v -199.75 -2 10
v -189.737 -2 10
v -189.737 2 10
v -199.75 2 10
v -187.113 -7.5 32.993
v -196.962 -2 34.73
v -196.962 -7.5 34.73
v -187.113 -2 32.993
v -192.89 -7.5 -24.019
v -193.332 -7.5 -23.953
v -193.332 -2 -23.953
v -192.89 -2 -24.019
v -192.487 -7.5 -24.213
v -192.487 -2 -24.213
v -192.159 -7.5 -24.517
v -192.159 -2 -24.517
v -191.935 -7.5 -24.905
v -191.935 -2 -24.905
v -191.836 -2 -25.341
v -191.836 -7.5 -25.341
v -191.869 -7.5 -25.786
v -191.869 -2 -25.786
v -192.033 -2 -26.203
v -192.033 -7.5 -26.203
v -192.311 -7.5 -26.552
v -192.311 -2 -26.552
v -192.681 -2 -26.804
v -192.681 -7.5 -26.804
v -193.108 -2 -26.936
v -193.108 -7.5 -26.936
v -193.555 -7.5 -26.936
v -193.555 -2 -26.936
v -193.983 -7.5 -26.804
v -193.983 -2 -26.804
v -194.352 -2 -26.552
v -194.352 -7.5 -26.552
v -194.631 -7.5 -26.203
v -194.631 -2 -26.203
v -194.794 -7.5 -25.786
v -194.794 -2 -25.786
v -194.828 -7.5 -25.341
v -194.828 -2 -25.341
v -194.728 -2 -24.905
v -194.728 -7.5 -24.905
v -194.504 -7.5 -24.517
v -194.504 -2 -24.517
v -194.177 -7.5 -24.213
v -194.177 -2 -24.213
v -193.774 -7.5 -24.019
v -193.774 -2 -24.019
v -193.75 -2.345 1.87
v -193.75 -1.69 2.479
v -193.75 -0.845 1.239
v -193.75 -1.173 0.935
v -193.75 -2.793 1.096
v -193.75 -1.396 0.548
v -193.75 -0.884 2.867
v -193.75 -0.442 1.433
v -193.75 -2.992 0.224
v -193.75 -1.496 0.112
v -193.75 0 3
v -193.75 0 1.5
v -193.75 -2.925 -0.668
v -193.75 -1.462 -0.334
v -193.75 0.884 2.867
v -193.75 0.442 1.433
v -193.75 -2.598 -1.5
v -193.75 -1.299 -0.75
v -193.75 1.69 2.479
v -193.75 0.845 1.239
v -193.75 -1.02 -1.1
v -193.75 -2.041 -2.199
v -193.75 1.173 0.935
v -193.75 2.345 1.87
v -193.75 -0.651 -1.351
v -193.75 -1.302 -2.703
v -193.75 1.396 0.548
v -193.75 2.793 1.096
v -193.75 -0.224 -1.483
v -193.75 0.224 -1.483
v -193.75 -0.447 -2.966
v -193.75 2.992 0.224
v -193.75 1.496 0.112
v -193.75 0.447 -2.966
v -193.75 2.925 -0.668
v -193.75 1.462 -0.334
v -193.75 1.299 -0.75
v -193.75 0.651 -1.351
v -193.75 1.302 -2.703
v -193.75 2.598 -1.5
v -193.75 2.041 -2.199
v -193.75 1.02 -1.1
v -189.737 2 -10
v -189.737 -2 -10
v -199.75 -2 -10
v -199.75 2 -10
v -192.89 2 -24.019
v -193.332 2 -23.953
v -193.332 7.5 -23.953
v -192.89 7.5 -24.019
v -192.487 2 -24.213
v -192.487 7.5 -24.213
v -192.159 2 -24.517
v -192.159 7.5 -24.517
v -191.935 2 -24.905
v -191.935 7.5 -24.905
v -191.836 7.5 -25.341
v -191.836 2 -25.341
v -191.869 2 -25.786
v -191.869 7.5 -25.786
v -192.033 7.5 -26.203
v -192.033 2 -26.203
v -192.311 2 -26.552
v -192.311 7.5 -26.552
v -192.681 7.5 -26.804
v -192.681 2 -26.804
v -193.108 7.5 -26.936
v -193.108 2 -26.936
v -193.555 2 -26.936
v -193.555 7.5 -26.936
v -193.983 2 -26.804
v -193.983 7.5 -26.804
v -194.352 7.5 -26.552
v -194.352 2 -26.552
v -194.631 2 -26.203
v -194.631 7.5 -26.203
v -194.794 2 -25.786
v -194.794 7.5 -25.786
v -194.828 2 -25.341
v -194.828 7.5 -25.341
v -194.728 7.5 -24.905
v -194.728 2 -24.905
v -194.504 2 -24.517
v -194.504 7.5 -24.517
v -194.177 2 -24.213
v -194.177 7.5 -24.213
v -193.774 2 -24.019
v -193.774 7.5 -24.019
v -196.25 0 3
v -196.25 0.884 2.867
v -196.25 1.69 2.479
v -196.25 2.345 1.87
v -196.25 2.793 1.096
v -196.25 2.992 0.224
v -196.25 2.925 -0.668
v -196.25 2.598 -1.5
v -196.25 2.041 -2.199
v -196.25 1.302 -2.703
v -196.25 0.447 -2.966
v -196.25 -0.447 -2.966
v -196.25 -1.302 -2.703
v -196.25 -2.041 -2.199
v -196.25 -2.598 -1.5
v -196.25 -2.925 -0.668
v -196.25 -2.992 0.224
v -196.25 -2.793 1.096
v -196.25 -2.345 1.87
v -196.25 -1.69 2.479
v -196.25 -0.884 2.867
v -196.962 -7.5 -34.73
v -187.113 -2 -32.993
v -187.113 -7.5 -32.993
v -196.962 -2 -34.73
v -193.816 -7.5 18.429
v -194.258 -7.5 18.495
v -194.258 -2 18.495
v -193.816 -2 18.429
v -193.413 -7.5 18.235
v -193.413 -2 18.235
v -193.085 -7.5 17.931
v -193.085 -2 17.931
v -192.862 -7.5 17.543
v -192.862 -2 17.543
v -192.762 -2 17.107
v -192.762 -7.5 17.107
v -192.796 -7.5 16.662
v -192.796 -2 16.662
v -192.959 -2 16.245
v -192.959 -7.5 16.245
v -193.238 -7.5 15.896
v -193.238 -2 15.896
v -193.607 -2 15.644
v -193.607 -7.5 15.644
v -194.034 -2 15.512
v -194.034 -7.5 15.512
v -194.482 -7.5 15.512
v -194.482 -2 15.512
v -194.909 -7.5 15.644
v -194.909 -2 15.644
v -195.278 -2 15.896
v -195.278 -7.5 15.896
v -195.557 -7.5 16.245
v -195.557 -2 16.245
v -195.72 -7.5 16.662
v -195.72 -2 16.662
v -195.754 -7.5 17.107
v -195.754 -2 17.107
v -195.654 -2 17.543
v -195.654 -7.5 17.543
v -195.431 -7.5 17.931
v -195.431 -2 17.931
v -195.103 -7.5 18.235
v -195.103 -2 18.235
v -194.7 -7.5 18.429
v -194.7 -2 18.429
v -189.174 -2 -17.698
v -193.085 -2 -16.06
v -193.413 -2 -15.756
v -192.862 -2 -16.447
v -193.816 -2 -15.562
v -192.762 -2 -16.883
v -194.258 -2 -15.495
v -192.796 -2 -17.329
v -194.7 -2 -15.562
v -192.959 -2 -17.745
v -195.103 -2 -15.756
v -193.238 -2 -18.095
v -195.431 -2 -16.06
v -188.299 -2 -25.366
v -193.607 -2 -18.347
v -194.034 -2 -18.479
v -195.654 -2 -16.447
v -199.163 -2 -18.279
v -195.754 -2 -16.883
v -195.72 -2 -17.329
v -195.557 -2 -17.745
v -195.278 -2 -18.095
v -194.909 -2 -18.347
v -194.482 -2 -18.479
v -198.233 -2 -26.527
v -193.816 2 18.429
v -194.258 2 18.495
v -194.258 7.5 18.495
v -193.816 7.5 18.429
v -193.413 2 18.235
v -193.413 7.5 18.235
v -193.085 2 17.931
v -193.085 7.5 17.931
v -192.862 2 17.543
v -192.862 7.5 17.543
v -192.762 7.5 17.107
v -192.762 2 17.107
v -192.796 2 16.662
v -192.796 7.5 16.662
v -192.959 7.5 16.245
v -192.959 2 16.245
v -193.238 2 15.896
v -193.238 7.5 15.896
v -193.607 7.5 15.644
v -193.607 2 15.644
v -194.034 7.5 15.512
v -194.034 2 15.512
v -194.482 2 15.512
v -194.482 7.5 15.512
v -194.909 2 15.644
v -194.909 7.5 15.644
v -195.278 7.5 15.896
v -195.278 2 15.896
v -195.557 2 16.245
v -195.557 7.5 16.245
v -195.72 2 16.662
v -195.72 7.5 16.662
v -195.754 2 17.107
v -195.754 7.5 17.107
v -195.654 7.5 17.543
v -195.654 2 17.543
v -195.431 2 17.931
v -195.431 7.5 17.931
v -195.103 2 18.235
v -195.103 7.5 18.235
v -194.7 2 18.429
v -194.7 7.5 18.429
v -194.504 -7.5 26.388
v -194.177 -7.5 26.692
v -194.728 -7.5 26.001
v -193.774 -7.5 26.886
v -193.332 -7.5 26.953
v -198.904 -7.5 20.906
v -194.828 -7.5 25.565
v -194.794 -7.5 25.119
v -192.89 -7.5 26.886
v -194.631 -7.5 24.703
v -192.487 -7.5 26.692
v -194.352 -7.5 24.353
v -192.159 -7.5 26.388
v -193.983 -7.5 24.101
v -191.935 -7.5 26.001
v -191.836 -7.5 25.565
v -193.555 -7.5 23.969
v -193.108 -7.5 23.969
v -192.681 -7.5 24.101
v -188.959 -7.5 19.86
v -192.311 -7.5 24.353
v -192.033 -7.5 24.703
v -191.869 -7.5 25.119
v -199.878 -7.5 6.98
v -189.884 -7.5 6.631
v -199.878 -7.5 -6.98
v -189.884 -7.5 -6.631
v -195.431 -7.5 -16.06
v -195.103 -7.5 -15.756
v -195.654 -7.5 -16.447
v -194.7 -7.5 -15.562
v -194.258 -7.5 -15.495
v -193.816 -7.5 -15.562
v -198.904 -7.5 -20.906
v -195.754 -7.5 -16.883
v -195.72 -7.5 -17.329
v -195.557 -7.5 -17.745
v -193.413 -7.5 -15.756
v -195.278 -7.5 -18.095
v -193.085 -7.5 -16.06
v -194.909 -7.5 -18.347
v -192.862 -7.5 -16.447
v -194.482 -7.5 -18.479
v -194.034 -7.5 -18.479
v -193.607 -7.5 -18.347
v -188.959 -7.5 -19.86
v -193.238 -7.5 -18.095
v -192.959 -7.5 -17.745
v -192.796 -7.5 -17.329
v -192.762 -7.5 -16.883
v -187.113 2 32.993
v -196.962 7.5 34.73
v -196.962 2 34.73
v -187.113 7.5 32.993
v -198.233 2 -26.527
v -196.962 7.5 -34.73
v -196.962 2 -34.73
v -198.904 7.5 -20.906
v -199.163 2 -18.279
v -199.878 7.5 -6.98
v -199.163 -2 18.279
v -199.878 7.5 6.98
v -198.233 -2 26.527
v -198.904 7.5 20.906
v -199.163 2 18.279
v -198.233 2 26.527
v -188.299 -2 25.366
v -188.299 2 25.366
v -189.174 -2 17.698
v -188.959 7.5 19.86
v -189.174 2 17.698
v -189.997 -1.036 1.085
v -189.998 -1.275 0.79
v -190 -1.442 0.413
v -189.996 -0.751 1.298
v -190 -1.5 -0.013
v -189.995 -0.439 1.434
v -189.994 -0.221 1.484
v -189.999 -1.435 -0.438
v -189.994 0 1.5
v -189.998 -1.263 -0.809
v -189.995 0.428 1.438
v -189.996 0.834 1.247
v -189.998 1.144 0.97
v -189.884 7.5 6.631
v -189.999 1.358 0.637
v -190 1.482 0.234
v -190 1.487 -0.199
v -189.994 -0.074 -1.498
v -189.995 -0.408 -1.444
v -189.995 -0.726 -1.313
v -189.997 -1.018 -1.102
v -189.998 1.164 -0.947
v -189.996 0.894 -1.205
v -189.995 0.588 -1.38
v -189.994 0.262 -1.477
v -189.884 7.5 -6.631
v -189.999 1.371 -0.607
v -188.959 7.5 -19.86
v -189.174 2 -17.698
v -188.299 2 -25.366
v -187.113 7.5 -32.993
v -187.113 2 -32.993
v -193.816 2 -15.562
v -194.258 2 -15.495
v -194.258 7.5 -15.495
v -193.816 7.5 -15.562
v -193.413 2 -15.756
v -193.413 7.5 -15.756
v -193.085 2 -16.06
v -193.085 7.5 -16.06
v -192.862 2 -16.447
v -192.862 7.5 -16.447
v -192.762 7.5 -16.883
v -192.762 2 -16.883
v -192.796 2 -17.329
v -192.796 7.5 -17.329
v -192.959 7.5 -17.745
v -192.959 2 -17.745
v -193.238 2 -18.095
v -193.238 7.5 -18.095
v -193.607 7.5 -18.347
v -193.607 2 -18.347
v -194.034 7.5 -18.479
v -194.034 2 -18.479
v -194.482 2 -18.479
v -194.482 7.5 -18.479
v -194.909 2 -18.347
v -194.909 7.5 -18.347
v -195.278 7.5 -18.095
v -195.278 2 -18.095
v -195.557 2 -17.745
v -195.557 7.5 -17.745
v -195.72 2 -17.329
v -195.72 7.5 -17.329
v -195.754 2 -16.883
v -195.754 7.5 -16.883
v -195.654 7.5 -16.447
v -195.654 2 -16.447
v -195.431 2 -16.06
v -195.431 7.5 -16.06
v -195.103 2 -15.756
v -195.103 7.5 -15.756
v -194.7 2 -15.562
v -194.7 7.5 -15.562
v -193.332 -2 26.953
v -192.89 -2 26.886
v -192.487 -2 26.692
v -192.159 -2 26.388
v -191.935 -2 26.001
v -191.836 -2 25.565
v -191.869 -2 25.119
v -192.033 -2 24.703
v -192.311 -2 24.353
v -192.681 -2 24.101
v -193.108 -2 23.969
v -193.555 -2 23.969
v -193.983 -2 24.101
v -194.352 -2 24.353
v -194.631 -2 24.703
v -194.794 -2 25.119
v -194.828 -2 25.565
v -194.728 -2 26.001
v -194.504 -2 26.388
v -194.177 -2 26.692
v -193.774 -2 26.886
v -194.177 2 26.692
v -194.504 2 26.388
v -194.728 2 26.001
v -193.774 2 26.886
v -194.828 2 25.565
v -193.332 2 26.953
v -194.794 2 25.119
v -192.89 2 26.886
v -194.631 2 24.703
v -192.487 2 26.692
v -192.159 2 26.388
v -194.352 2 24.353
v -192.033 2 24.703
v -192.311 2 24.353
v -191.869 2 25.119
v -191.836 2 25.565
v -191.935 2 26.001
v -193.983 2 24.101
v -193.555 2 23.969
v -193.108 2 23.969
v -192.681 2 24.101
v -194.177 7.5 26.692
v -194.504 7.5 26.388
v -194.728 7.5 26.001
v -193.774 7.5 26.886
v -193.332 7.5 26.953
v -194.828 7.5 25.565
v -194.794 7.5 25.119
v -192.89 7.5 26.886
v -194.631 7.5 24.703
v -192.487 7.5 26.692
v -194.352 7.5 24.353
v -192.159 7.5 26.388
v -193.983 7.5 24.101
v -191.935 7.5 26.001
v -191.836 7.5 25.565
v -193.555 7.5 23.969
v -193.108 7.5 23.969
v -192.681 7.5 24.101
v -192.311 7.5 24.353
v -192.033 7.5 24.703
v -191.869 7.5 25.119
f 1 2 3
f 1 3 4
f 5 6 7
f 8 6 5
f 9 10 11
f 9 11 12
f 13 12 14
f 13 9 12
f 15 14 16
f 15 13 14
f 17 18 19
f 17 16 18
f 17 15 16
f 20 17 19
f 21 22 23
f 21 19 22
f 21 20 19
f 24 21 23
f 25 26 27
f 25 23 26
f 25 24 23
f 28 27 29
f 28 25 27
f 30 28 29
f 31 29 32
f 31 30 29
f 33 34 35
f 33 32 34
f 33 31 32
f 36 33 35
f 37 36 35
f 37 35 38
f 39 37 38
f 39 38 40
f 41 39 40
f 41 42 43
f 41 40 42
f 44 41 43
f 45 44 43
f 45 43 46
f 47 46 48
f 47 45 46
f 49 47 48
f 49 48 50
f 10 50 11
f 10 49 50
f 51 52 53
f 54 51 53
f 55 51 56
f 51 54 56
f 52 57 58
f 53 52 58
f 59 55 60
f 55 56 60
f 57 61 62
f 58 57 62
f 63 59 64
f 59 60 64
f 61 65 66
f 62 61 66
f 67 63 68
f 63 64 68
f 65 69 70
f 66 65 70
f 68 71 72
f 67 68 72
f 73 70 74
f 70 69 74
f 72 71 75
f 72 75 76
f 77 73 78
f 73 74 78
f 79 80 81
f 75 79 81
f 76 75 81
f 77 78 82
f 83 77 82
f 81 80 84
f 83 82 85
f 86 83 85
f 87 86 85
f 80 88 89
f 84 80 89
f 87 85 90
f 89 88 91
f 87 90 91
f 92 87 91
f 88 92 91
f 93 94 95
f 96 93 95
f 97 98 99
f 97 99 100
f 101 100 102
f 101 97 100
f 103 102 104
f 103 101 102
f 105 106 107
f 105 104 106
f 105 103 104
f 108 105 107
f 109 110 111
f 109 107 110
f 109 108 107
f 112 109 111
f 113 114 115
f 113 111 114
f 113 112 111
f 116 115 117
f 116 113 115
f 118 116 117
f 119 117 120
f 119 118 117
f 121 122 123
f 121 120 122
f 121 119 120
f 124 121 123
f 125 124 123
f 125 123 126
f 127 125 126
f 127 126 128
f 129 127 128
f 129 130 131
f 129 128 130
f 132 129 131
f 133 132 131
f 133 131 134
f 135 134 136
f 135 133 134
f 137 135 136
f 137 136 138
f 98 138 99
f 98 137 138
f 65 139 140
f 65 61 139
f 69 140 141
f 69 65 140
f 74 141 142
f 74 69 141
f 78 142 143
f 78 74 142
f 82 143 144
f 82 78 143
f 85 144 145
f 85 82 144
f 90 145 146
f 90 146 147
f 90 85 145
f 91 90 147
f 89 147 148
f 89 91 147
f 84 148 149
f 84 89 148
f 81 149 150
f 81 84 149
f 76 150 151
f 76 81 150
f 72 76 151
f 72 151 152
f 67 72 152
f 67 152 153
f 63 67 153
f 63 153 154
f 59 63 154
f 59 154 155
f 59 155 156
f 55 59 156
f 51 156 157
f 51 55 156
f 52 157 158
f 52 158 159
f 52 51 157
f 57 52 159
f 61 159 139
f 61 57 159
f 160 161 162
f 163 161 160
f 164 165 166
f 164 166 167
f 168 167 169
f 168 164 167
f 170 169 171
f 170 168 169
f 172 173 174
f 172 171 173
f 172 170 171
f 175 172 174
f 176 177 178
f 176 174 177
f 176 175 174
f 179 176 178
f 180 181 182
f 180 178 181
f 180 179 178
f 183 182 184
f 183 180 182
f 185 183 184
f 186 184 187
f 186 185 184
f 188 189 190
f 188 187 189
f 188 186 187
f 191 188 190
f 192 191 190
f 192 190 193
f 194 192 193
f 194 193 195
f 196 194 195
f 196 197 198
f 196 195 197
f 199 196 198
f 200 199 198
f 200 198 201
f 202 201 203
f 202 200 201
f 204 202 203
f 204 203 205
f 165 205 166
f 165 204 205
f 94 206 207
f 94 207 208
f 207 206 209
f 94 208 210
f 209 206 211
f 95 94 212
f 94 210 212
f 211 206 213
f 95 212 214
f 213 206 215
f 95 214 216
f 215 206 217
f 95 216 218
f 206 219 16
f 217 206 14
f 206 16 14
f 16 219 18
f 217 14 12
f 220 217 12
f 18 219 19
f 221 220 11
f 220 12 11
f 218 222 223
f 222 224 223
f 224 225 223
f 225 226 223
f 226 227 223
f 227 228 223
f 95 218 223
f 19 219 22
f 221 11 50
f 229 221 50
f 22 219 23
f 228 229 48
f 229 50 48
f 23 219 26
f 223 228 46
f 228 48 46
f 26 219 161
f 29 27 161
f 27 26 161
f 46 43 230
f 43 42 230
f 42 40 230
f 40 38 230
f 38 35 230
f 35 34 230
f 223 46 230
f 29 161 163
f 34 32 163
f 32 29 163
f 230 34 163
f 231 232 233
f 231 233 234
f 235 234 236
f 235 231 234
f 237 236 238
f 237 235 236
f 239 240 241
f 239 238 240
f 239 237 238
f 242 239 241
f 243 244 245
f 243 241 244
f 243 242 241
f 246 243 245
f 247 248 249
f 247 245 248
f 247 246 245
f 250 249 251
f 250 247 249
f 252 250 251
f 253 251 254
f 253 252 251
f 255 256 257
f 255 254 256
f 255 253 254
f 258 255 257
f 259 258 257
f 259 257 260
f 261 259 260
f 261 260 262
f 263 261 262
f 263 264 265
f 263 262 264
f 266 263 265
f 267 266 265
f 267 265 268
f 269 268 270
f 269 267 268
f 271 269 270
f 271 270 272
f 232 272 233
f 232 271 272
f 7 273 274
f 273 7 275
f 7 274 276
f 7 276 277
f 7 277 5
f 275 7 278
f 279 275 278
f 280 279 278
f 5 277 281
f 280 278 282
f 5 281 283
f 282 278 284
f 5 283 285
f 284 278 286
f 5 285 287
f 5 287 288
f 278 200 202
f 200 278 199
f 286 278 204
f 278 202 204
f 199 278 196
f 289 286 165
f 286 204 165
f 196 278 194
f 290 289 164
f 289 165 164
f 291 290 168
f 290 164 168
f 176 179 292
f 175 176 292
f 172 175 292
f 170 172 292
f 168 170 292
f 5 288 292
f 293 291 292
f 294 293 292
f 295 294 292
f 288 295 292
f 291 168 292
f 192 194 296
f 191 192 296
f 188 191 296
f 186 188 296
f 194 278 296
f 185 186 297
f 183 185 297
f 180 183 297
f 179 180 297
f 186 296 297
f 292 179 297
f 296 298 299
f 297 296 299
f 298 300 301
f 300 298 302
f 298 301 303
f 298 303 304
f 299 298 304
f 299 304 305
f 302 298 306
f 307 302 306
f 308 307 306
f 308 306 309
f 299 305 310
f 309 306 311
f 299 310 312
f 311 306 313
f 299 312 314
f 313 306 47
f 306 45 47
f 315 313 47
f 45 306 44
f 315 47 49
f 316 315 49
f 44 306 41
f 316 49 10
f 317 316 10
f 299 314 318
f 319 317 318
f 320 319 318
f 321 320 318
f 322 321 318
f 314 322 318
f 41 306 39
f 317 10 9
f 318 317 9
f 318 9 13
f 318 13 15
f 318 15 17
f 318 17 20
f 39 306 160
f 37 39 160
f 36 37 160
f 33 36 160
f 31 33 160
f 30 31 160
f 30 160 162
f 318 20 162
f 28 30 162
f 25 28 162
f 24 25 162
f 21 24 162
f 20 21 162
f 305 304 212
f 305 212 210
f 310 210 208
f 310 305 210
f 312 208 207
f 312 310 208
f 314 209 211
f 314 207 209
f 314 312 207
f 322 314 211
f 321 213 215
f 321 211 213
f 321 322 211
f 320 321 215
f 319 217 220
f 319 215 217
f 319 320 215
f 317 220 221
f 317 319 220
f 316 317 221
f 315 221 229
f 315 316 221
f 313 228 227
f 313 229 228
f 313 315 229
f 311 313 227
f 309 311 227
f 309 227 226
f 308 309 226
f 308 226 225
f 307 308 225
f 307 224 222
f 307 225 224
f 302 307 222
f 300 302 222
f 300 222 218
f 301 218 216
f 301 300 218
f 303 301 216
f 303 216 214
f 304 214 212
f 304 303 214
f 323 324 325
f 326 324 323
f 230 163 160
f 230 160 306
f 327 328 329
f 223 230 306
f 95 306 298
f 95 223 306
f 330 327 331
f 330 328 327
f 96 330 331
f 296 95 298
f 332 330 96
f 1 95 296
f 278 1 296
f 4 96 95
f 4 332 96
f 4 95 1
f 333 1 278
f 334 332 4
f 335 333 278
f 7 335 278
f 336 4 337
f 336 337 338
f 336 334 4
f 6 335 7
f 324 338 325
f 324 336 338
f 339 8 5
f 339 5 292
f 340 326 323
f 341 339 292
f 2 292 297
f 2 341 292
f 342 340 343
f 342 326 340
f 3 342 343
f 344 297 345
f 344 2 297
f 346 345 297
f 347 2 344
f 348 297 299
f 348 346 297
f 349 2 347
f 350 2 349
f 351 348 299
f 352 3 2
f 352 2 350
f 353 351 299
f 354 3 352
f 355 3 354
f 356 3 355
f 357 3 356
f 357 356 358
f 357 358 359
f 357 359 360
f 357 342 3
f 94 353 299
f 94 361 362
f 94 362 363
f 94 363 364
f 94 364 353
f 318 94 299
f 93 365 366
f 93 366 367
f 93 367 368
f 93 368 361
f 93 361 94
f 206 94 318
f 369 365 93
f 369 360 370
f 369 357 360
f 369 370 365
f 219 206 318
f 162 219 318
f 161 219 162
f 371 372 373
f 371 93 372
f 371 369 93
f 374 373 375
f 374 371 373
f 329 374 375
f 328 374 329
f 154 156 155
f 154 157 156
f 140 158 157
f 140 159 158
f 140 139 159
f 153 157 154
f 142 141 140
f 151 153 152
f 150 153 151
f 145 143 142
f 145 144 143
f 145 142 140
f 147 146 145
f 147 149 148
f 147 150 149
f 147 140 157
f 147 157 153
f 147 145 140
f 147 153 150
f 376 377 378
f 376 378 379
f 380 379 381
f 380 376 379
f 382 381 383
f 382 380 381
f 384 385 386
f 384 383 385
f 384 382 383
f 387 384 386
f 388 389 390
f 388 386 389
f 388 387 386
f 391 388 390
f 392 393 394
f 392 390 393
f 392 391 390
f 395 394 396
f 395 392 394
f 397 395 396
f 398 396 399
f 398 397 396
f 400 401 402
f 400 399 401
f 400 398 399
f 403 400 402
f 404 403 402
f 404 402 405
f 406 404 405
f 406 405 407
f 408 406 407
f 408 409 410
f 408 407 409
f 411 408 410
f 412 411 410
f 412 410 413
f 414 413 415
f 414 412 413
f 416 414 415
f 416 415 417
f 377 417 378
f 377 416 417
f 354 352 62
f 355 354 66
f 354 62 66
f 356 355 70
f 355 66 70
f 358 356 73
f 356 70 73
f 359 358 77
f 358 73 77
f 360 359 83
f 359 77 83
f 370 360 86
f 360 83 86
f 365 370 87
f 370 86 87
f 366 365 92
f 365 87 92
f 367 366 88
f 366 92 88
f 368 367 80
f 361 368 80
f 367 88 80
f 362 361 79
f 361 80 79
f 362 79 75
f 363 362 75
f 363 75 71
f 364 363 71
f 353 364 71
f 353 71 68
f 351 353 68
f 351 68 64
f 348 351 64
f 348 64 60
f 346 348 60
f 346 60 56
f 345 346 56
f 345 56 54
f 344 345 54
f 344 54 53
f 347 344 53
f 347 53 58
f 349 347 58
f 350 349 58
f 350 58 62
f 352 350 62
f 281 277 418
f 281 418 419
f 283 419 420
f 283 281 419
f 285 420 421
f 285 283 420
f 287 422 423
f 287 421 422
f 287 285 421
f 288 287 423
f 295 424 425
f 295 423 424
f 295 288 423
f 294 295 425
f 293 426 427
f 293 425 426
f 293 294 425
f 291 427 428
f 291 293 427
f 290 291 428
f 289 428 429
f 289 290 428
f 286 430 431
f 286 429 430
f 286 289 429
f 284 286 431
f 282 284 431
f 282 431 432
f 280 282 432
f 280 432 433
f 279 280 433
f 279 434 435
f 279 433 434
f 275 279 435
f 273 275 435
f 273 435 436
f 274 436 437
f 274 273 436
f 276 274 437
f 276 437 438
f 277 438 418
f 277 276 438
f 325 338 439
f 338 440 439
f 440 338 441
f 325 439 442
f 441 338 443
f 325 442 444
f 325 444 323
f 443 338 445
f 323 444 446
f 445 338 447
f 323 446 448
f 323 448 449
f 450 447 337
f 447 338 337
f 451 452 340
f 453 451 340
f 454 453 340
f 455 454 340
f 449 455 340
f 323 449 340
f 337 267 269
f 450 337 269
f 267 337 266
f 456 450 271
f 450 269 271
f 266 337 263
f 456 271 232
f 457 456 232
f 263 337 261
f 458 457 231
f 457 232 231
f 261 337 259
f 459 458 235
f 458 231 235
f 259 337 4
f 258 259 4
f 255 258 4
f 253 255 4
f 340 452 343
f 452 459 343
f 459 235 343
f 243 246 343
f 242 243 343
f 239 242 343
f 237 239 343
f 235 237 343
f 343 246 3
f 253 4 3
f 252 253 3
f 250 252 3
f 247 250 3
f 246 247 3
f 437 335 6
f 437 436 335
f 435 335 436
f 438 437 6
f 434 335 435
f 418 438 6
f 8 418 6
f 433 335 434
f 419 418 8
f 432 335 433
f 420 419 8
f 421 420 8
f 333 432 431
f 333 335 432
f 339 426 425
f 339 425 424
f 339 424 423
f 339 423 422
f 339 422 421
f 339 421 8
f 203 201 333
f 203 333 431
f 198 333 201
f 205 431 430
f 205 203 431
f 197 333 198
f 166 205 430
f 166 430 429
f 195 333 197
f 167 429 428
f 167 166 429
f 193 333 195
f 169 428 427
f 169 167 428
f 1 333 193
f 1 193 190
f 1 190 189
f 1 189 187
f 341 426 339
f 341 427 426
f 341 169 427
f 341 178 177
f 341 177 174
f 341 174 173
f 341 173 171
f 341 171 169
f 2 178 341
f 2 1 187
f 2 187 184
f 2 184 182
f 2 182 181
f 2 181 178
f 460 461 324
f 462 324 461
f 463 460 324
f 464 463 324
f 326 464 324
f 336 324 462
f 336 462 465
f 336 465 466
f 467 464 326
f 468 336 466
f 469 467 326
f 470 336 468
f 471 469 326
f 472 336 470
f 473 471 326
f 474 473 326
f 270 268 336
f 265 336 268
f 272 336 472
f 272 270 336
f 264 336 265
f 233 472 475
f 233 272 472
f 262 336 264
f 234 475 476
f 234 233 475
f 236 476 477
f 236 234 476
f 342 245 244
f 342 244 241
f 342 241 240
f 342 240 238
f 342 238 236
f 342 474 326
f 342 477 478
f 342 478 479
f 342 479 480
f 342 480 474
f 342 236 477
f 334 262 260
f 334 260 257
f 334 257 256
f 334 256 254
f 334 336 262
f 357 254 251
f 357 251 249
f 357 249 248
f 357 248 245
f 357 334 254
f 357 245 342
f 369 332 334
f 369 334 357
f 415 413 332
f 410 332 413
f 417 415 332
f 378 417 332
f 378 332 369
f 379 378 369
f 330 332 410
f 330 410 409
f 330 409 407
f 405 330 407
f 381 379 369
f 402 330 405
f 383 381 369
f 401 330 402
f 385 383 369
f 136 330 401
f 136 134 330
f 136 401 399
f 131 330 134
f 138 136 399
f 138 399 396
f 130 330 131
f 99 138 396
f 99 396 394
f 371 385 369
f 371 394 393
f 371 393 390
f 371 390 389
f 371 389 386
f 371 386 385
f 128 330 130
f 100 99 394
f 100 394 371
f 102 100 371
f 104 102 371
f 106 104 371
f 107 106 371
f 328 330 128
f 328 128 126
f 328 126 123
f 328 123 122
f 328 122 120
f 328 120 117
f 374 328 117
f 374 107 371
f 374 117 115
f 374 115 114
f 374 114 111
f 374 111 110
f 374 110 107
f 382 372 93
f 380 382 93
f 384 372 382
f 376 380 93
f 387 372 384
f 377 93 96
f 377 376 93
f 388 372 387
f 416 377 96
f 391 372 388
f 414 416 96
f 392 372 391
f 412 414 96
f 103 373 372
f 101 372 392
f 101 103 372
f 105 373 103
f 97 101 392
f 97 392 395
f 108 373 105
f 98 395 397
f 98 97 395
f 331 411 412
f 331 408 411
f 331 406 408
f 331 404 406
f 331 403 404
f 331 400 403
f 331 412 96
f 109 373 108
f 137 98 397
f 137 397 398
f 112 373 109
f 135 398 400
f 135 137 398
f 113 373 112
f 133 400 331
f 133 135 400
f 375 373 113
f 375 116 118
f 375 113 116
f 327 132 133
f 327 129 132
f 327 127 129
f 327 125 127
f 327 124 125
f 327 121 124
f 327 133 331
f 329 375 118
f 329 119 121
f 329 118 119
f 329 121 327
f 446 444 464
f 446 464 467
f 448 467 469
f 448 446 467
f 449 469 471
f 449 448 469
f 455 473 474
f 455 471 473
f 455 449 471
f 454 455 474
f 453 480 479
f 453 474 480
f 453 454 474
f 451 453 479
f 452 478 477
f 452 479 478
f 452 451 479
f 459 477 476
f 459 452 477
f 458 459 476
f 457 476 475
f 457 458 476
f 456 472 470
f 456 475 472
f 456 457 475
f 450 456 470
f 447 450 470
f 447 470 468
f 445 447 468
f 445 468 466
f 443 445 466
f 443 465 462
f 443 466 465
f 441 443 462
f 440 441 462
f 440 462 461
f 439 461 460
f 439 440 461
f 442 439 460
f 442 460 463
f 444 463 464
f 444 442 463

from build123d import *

# Parameters (mm, degrees)
BASE_DEPTH            = 7.5
MOUNT_START           = -2
MOUNT_DEPTH           = 4
MOUNT_HOLE_DEPTH      = 204.131478566
MOUNT_HOLE_DEPTH_BACK = 204.131478566
SKETCH12_R            = 1.5
SKETCH14_R            = 1.5
SHAFT_HOLE_DEPTH      = 37.394984425
SKETCH13_W            = 2.5
SKETCH13_H            = 3


with BuildPart() as part:
    # Sketch9 → base (new, symmetric)
    with BuildSketch(Plane(origin=(0, 0, 0), x_dir=(1, 0, 0), z_dir=(0, 1, 0))):
        with BuildLine():
            ThreePointArc((-187.113473072, -32.993153757), (-190, 0), (-187.113473072, 32.993153757))
            Line((-187.113473072, 32.993153757), (-196.961550602, 34.729635533))
            ThreePointArc((-196.961550602, 34.729635533), (-200, 0), (-196.961550602, -34.729635533))
            Line((-196.961550602, -34.729635533), (-187.113473072, -32.993153757))
        make_face()
    extrude(amount=BASE_DEPTH, both=True)

    # Sketch11 → mount (cut)
    with BuildSketch(Plane(origin=(0, 0, 0), x_dir=(1, 0, 0), z_dir=(0, 1, 0)).offset(MOUNT_START)):
        with BuildLine():
            Line((-189.73665961, -10), (-199.749843554, -10))
            ThreePointArc((-199.749843554, -10), (-198.7407137, -22.408228804), (-196.961550602, -34.729635533))
            Line((-196.961550602, -34.729635533), (-187.113473072, -32.993153757))
            ThreePointArc((-187.113473072, -32.993153757), (-188.775466906, -21.536552519), (-189.73665961, -10))
        make_face()
        with BuildLine():
            Line((-189.73665961, 10), (-199.749843554, 10))
            ThreePointArc((-199.749843554, 10), (-198.7407137, 22.408228804), (-196.961550602, 34.729635533))
            Line((-196.961550602, 34.729635533), (-187.113473072, 32.993153757))
            ThreePointArc((-187.113473072, 32.993153757), (-188.775466906, 21.536552519), (-189.73665961, 10))
        make_face()
    extrude(amount=MOUNT_DEPTH, mode=Mode.SUBTRACT)

    # Sketch12 → mount hole (cut, two sides: drawn at the far end of the back side and taken through both)
    with BuildSketch(Plane(origin=(0, 0, 0), x_dir=(1, 0, 0), z_dir=(0, 1, 0)).offset(-MOUNT_HOLE_DEPTH_BACK)):
        with Locations(Location((-193.331747968, 25.452607483, 0), (0, 0, 270))):
            Circle(SKETCH12_R)
        with Locations(Location((-194.257966128, 16.995369836, 0), (0, 0, 270))):
            Circle(SKETCH12_R)
        with Locations(Location((-194.257966128, -16.995369836, 0), (0, 0, 270))):
            Circle(SKETCH12_R)
        with Locations(Location((-193.331747968, -25.452607483, 0), (0, 0, 270))):
            Circle(SKETCH12_R)
    extrude(amount=MOUNT_HOLE_DEPTH + MOUNT_HOLE_DEPTH_BACK, mode=Mode.SUBTRACT)

    # Sketch14 → shaft hole (cut, through all)
    with BuildSketch(Plane.ZY.offset(195)):
        Circle(SKETCH14_R)
    extrude(amount=-SHAFT_HOLE_DEPTH, mode=Mode.SUBTRACT)

    # Sketch13 → bearing hole (revolve, cut)
    with BuildSketch(Plane(origin=(0, 0, 0), x_dir=(1, 0, 0), z_dir=(0, 1, 0)), mode=Mode.PRIVATE) as bearing_hole_sk:
        with Locations((-195, 1.5)):
            Rectangle(SKETCH13_W, SKETCH13_H)
    revolve(bearing_hole_sk.sketch.rotate(Axis((0, 0, 0), (-1, 0, 0)), 180), axis=Axis((0, 0, 0), (-1, 0, 0)), mode=Mode.SUBTRACT)


solid = part.part
